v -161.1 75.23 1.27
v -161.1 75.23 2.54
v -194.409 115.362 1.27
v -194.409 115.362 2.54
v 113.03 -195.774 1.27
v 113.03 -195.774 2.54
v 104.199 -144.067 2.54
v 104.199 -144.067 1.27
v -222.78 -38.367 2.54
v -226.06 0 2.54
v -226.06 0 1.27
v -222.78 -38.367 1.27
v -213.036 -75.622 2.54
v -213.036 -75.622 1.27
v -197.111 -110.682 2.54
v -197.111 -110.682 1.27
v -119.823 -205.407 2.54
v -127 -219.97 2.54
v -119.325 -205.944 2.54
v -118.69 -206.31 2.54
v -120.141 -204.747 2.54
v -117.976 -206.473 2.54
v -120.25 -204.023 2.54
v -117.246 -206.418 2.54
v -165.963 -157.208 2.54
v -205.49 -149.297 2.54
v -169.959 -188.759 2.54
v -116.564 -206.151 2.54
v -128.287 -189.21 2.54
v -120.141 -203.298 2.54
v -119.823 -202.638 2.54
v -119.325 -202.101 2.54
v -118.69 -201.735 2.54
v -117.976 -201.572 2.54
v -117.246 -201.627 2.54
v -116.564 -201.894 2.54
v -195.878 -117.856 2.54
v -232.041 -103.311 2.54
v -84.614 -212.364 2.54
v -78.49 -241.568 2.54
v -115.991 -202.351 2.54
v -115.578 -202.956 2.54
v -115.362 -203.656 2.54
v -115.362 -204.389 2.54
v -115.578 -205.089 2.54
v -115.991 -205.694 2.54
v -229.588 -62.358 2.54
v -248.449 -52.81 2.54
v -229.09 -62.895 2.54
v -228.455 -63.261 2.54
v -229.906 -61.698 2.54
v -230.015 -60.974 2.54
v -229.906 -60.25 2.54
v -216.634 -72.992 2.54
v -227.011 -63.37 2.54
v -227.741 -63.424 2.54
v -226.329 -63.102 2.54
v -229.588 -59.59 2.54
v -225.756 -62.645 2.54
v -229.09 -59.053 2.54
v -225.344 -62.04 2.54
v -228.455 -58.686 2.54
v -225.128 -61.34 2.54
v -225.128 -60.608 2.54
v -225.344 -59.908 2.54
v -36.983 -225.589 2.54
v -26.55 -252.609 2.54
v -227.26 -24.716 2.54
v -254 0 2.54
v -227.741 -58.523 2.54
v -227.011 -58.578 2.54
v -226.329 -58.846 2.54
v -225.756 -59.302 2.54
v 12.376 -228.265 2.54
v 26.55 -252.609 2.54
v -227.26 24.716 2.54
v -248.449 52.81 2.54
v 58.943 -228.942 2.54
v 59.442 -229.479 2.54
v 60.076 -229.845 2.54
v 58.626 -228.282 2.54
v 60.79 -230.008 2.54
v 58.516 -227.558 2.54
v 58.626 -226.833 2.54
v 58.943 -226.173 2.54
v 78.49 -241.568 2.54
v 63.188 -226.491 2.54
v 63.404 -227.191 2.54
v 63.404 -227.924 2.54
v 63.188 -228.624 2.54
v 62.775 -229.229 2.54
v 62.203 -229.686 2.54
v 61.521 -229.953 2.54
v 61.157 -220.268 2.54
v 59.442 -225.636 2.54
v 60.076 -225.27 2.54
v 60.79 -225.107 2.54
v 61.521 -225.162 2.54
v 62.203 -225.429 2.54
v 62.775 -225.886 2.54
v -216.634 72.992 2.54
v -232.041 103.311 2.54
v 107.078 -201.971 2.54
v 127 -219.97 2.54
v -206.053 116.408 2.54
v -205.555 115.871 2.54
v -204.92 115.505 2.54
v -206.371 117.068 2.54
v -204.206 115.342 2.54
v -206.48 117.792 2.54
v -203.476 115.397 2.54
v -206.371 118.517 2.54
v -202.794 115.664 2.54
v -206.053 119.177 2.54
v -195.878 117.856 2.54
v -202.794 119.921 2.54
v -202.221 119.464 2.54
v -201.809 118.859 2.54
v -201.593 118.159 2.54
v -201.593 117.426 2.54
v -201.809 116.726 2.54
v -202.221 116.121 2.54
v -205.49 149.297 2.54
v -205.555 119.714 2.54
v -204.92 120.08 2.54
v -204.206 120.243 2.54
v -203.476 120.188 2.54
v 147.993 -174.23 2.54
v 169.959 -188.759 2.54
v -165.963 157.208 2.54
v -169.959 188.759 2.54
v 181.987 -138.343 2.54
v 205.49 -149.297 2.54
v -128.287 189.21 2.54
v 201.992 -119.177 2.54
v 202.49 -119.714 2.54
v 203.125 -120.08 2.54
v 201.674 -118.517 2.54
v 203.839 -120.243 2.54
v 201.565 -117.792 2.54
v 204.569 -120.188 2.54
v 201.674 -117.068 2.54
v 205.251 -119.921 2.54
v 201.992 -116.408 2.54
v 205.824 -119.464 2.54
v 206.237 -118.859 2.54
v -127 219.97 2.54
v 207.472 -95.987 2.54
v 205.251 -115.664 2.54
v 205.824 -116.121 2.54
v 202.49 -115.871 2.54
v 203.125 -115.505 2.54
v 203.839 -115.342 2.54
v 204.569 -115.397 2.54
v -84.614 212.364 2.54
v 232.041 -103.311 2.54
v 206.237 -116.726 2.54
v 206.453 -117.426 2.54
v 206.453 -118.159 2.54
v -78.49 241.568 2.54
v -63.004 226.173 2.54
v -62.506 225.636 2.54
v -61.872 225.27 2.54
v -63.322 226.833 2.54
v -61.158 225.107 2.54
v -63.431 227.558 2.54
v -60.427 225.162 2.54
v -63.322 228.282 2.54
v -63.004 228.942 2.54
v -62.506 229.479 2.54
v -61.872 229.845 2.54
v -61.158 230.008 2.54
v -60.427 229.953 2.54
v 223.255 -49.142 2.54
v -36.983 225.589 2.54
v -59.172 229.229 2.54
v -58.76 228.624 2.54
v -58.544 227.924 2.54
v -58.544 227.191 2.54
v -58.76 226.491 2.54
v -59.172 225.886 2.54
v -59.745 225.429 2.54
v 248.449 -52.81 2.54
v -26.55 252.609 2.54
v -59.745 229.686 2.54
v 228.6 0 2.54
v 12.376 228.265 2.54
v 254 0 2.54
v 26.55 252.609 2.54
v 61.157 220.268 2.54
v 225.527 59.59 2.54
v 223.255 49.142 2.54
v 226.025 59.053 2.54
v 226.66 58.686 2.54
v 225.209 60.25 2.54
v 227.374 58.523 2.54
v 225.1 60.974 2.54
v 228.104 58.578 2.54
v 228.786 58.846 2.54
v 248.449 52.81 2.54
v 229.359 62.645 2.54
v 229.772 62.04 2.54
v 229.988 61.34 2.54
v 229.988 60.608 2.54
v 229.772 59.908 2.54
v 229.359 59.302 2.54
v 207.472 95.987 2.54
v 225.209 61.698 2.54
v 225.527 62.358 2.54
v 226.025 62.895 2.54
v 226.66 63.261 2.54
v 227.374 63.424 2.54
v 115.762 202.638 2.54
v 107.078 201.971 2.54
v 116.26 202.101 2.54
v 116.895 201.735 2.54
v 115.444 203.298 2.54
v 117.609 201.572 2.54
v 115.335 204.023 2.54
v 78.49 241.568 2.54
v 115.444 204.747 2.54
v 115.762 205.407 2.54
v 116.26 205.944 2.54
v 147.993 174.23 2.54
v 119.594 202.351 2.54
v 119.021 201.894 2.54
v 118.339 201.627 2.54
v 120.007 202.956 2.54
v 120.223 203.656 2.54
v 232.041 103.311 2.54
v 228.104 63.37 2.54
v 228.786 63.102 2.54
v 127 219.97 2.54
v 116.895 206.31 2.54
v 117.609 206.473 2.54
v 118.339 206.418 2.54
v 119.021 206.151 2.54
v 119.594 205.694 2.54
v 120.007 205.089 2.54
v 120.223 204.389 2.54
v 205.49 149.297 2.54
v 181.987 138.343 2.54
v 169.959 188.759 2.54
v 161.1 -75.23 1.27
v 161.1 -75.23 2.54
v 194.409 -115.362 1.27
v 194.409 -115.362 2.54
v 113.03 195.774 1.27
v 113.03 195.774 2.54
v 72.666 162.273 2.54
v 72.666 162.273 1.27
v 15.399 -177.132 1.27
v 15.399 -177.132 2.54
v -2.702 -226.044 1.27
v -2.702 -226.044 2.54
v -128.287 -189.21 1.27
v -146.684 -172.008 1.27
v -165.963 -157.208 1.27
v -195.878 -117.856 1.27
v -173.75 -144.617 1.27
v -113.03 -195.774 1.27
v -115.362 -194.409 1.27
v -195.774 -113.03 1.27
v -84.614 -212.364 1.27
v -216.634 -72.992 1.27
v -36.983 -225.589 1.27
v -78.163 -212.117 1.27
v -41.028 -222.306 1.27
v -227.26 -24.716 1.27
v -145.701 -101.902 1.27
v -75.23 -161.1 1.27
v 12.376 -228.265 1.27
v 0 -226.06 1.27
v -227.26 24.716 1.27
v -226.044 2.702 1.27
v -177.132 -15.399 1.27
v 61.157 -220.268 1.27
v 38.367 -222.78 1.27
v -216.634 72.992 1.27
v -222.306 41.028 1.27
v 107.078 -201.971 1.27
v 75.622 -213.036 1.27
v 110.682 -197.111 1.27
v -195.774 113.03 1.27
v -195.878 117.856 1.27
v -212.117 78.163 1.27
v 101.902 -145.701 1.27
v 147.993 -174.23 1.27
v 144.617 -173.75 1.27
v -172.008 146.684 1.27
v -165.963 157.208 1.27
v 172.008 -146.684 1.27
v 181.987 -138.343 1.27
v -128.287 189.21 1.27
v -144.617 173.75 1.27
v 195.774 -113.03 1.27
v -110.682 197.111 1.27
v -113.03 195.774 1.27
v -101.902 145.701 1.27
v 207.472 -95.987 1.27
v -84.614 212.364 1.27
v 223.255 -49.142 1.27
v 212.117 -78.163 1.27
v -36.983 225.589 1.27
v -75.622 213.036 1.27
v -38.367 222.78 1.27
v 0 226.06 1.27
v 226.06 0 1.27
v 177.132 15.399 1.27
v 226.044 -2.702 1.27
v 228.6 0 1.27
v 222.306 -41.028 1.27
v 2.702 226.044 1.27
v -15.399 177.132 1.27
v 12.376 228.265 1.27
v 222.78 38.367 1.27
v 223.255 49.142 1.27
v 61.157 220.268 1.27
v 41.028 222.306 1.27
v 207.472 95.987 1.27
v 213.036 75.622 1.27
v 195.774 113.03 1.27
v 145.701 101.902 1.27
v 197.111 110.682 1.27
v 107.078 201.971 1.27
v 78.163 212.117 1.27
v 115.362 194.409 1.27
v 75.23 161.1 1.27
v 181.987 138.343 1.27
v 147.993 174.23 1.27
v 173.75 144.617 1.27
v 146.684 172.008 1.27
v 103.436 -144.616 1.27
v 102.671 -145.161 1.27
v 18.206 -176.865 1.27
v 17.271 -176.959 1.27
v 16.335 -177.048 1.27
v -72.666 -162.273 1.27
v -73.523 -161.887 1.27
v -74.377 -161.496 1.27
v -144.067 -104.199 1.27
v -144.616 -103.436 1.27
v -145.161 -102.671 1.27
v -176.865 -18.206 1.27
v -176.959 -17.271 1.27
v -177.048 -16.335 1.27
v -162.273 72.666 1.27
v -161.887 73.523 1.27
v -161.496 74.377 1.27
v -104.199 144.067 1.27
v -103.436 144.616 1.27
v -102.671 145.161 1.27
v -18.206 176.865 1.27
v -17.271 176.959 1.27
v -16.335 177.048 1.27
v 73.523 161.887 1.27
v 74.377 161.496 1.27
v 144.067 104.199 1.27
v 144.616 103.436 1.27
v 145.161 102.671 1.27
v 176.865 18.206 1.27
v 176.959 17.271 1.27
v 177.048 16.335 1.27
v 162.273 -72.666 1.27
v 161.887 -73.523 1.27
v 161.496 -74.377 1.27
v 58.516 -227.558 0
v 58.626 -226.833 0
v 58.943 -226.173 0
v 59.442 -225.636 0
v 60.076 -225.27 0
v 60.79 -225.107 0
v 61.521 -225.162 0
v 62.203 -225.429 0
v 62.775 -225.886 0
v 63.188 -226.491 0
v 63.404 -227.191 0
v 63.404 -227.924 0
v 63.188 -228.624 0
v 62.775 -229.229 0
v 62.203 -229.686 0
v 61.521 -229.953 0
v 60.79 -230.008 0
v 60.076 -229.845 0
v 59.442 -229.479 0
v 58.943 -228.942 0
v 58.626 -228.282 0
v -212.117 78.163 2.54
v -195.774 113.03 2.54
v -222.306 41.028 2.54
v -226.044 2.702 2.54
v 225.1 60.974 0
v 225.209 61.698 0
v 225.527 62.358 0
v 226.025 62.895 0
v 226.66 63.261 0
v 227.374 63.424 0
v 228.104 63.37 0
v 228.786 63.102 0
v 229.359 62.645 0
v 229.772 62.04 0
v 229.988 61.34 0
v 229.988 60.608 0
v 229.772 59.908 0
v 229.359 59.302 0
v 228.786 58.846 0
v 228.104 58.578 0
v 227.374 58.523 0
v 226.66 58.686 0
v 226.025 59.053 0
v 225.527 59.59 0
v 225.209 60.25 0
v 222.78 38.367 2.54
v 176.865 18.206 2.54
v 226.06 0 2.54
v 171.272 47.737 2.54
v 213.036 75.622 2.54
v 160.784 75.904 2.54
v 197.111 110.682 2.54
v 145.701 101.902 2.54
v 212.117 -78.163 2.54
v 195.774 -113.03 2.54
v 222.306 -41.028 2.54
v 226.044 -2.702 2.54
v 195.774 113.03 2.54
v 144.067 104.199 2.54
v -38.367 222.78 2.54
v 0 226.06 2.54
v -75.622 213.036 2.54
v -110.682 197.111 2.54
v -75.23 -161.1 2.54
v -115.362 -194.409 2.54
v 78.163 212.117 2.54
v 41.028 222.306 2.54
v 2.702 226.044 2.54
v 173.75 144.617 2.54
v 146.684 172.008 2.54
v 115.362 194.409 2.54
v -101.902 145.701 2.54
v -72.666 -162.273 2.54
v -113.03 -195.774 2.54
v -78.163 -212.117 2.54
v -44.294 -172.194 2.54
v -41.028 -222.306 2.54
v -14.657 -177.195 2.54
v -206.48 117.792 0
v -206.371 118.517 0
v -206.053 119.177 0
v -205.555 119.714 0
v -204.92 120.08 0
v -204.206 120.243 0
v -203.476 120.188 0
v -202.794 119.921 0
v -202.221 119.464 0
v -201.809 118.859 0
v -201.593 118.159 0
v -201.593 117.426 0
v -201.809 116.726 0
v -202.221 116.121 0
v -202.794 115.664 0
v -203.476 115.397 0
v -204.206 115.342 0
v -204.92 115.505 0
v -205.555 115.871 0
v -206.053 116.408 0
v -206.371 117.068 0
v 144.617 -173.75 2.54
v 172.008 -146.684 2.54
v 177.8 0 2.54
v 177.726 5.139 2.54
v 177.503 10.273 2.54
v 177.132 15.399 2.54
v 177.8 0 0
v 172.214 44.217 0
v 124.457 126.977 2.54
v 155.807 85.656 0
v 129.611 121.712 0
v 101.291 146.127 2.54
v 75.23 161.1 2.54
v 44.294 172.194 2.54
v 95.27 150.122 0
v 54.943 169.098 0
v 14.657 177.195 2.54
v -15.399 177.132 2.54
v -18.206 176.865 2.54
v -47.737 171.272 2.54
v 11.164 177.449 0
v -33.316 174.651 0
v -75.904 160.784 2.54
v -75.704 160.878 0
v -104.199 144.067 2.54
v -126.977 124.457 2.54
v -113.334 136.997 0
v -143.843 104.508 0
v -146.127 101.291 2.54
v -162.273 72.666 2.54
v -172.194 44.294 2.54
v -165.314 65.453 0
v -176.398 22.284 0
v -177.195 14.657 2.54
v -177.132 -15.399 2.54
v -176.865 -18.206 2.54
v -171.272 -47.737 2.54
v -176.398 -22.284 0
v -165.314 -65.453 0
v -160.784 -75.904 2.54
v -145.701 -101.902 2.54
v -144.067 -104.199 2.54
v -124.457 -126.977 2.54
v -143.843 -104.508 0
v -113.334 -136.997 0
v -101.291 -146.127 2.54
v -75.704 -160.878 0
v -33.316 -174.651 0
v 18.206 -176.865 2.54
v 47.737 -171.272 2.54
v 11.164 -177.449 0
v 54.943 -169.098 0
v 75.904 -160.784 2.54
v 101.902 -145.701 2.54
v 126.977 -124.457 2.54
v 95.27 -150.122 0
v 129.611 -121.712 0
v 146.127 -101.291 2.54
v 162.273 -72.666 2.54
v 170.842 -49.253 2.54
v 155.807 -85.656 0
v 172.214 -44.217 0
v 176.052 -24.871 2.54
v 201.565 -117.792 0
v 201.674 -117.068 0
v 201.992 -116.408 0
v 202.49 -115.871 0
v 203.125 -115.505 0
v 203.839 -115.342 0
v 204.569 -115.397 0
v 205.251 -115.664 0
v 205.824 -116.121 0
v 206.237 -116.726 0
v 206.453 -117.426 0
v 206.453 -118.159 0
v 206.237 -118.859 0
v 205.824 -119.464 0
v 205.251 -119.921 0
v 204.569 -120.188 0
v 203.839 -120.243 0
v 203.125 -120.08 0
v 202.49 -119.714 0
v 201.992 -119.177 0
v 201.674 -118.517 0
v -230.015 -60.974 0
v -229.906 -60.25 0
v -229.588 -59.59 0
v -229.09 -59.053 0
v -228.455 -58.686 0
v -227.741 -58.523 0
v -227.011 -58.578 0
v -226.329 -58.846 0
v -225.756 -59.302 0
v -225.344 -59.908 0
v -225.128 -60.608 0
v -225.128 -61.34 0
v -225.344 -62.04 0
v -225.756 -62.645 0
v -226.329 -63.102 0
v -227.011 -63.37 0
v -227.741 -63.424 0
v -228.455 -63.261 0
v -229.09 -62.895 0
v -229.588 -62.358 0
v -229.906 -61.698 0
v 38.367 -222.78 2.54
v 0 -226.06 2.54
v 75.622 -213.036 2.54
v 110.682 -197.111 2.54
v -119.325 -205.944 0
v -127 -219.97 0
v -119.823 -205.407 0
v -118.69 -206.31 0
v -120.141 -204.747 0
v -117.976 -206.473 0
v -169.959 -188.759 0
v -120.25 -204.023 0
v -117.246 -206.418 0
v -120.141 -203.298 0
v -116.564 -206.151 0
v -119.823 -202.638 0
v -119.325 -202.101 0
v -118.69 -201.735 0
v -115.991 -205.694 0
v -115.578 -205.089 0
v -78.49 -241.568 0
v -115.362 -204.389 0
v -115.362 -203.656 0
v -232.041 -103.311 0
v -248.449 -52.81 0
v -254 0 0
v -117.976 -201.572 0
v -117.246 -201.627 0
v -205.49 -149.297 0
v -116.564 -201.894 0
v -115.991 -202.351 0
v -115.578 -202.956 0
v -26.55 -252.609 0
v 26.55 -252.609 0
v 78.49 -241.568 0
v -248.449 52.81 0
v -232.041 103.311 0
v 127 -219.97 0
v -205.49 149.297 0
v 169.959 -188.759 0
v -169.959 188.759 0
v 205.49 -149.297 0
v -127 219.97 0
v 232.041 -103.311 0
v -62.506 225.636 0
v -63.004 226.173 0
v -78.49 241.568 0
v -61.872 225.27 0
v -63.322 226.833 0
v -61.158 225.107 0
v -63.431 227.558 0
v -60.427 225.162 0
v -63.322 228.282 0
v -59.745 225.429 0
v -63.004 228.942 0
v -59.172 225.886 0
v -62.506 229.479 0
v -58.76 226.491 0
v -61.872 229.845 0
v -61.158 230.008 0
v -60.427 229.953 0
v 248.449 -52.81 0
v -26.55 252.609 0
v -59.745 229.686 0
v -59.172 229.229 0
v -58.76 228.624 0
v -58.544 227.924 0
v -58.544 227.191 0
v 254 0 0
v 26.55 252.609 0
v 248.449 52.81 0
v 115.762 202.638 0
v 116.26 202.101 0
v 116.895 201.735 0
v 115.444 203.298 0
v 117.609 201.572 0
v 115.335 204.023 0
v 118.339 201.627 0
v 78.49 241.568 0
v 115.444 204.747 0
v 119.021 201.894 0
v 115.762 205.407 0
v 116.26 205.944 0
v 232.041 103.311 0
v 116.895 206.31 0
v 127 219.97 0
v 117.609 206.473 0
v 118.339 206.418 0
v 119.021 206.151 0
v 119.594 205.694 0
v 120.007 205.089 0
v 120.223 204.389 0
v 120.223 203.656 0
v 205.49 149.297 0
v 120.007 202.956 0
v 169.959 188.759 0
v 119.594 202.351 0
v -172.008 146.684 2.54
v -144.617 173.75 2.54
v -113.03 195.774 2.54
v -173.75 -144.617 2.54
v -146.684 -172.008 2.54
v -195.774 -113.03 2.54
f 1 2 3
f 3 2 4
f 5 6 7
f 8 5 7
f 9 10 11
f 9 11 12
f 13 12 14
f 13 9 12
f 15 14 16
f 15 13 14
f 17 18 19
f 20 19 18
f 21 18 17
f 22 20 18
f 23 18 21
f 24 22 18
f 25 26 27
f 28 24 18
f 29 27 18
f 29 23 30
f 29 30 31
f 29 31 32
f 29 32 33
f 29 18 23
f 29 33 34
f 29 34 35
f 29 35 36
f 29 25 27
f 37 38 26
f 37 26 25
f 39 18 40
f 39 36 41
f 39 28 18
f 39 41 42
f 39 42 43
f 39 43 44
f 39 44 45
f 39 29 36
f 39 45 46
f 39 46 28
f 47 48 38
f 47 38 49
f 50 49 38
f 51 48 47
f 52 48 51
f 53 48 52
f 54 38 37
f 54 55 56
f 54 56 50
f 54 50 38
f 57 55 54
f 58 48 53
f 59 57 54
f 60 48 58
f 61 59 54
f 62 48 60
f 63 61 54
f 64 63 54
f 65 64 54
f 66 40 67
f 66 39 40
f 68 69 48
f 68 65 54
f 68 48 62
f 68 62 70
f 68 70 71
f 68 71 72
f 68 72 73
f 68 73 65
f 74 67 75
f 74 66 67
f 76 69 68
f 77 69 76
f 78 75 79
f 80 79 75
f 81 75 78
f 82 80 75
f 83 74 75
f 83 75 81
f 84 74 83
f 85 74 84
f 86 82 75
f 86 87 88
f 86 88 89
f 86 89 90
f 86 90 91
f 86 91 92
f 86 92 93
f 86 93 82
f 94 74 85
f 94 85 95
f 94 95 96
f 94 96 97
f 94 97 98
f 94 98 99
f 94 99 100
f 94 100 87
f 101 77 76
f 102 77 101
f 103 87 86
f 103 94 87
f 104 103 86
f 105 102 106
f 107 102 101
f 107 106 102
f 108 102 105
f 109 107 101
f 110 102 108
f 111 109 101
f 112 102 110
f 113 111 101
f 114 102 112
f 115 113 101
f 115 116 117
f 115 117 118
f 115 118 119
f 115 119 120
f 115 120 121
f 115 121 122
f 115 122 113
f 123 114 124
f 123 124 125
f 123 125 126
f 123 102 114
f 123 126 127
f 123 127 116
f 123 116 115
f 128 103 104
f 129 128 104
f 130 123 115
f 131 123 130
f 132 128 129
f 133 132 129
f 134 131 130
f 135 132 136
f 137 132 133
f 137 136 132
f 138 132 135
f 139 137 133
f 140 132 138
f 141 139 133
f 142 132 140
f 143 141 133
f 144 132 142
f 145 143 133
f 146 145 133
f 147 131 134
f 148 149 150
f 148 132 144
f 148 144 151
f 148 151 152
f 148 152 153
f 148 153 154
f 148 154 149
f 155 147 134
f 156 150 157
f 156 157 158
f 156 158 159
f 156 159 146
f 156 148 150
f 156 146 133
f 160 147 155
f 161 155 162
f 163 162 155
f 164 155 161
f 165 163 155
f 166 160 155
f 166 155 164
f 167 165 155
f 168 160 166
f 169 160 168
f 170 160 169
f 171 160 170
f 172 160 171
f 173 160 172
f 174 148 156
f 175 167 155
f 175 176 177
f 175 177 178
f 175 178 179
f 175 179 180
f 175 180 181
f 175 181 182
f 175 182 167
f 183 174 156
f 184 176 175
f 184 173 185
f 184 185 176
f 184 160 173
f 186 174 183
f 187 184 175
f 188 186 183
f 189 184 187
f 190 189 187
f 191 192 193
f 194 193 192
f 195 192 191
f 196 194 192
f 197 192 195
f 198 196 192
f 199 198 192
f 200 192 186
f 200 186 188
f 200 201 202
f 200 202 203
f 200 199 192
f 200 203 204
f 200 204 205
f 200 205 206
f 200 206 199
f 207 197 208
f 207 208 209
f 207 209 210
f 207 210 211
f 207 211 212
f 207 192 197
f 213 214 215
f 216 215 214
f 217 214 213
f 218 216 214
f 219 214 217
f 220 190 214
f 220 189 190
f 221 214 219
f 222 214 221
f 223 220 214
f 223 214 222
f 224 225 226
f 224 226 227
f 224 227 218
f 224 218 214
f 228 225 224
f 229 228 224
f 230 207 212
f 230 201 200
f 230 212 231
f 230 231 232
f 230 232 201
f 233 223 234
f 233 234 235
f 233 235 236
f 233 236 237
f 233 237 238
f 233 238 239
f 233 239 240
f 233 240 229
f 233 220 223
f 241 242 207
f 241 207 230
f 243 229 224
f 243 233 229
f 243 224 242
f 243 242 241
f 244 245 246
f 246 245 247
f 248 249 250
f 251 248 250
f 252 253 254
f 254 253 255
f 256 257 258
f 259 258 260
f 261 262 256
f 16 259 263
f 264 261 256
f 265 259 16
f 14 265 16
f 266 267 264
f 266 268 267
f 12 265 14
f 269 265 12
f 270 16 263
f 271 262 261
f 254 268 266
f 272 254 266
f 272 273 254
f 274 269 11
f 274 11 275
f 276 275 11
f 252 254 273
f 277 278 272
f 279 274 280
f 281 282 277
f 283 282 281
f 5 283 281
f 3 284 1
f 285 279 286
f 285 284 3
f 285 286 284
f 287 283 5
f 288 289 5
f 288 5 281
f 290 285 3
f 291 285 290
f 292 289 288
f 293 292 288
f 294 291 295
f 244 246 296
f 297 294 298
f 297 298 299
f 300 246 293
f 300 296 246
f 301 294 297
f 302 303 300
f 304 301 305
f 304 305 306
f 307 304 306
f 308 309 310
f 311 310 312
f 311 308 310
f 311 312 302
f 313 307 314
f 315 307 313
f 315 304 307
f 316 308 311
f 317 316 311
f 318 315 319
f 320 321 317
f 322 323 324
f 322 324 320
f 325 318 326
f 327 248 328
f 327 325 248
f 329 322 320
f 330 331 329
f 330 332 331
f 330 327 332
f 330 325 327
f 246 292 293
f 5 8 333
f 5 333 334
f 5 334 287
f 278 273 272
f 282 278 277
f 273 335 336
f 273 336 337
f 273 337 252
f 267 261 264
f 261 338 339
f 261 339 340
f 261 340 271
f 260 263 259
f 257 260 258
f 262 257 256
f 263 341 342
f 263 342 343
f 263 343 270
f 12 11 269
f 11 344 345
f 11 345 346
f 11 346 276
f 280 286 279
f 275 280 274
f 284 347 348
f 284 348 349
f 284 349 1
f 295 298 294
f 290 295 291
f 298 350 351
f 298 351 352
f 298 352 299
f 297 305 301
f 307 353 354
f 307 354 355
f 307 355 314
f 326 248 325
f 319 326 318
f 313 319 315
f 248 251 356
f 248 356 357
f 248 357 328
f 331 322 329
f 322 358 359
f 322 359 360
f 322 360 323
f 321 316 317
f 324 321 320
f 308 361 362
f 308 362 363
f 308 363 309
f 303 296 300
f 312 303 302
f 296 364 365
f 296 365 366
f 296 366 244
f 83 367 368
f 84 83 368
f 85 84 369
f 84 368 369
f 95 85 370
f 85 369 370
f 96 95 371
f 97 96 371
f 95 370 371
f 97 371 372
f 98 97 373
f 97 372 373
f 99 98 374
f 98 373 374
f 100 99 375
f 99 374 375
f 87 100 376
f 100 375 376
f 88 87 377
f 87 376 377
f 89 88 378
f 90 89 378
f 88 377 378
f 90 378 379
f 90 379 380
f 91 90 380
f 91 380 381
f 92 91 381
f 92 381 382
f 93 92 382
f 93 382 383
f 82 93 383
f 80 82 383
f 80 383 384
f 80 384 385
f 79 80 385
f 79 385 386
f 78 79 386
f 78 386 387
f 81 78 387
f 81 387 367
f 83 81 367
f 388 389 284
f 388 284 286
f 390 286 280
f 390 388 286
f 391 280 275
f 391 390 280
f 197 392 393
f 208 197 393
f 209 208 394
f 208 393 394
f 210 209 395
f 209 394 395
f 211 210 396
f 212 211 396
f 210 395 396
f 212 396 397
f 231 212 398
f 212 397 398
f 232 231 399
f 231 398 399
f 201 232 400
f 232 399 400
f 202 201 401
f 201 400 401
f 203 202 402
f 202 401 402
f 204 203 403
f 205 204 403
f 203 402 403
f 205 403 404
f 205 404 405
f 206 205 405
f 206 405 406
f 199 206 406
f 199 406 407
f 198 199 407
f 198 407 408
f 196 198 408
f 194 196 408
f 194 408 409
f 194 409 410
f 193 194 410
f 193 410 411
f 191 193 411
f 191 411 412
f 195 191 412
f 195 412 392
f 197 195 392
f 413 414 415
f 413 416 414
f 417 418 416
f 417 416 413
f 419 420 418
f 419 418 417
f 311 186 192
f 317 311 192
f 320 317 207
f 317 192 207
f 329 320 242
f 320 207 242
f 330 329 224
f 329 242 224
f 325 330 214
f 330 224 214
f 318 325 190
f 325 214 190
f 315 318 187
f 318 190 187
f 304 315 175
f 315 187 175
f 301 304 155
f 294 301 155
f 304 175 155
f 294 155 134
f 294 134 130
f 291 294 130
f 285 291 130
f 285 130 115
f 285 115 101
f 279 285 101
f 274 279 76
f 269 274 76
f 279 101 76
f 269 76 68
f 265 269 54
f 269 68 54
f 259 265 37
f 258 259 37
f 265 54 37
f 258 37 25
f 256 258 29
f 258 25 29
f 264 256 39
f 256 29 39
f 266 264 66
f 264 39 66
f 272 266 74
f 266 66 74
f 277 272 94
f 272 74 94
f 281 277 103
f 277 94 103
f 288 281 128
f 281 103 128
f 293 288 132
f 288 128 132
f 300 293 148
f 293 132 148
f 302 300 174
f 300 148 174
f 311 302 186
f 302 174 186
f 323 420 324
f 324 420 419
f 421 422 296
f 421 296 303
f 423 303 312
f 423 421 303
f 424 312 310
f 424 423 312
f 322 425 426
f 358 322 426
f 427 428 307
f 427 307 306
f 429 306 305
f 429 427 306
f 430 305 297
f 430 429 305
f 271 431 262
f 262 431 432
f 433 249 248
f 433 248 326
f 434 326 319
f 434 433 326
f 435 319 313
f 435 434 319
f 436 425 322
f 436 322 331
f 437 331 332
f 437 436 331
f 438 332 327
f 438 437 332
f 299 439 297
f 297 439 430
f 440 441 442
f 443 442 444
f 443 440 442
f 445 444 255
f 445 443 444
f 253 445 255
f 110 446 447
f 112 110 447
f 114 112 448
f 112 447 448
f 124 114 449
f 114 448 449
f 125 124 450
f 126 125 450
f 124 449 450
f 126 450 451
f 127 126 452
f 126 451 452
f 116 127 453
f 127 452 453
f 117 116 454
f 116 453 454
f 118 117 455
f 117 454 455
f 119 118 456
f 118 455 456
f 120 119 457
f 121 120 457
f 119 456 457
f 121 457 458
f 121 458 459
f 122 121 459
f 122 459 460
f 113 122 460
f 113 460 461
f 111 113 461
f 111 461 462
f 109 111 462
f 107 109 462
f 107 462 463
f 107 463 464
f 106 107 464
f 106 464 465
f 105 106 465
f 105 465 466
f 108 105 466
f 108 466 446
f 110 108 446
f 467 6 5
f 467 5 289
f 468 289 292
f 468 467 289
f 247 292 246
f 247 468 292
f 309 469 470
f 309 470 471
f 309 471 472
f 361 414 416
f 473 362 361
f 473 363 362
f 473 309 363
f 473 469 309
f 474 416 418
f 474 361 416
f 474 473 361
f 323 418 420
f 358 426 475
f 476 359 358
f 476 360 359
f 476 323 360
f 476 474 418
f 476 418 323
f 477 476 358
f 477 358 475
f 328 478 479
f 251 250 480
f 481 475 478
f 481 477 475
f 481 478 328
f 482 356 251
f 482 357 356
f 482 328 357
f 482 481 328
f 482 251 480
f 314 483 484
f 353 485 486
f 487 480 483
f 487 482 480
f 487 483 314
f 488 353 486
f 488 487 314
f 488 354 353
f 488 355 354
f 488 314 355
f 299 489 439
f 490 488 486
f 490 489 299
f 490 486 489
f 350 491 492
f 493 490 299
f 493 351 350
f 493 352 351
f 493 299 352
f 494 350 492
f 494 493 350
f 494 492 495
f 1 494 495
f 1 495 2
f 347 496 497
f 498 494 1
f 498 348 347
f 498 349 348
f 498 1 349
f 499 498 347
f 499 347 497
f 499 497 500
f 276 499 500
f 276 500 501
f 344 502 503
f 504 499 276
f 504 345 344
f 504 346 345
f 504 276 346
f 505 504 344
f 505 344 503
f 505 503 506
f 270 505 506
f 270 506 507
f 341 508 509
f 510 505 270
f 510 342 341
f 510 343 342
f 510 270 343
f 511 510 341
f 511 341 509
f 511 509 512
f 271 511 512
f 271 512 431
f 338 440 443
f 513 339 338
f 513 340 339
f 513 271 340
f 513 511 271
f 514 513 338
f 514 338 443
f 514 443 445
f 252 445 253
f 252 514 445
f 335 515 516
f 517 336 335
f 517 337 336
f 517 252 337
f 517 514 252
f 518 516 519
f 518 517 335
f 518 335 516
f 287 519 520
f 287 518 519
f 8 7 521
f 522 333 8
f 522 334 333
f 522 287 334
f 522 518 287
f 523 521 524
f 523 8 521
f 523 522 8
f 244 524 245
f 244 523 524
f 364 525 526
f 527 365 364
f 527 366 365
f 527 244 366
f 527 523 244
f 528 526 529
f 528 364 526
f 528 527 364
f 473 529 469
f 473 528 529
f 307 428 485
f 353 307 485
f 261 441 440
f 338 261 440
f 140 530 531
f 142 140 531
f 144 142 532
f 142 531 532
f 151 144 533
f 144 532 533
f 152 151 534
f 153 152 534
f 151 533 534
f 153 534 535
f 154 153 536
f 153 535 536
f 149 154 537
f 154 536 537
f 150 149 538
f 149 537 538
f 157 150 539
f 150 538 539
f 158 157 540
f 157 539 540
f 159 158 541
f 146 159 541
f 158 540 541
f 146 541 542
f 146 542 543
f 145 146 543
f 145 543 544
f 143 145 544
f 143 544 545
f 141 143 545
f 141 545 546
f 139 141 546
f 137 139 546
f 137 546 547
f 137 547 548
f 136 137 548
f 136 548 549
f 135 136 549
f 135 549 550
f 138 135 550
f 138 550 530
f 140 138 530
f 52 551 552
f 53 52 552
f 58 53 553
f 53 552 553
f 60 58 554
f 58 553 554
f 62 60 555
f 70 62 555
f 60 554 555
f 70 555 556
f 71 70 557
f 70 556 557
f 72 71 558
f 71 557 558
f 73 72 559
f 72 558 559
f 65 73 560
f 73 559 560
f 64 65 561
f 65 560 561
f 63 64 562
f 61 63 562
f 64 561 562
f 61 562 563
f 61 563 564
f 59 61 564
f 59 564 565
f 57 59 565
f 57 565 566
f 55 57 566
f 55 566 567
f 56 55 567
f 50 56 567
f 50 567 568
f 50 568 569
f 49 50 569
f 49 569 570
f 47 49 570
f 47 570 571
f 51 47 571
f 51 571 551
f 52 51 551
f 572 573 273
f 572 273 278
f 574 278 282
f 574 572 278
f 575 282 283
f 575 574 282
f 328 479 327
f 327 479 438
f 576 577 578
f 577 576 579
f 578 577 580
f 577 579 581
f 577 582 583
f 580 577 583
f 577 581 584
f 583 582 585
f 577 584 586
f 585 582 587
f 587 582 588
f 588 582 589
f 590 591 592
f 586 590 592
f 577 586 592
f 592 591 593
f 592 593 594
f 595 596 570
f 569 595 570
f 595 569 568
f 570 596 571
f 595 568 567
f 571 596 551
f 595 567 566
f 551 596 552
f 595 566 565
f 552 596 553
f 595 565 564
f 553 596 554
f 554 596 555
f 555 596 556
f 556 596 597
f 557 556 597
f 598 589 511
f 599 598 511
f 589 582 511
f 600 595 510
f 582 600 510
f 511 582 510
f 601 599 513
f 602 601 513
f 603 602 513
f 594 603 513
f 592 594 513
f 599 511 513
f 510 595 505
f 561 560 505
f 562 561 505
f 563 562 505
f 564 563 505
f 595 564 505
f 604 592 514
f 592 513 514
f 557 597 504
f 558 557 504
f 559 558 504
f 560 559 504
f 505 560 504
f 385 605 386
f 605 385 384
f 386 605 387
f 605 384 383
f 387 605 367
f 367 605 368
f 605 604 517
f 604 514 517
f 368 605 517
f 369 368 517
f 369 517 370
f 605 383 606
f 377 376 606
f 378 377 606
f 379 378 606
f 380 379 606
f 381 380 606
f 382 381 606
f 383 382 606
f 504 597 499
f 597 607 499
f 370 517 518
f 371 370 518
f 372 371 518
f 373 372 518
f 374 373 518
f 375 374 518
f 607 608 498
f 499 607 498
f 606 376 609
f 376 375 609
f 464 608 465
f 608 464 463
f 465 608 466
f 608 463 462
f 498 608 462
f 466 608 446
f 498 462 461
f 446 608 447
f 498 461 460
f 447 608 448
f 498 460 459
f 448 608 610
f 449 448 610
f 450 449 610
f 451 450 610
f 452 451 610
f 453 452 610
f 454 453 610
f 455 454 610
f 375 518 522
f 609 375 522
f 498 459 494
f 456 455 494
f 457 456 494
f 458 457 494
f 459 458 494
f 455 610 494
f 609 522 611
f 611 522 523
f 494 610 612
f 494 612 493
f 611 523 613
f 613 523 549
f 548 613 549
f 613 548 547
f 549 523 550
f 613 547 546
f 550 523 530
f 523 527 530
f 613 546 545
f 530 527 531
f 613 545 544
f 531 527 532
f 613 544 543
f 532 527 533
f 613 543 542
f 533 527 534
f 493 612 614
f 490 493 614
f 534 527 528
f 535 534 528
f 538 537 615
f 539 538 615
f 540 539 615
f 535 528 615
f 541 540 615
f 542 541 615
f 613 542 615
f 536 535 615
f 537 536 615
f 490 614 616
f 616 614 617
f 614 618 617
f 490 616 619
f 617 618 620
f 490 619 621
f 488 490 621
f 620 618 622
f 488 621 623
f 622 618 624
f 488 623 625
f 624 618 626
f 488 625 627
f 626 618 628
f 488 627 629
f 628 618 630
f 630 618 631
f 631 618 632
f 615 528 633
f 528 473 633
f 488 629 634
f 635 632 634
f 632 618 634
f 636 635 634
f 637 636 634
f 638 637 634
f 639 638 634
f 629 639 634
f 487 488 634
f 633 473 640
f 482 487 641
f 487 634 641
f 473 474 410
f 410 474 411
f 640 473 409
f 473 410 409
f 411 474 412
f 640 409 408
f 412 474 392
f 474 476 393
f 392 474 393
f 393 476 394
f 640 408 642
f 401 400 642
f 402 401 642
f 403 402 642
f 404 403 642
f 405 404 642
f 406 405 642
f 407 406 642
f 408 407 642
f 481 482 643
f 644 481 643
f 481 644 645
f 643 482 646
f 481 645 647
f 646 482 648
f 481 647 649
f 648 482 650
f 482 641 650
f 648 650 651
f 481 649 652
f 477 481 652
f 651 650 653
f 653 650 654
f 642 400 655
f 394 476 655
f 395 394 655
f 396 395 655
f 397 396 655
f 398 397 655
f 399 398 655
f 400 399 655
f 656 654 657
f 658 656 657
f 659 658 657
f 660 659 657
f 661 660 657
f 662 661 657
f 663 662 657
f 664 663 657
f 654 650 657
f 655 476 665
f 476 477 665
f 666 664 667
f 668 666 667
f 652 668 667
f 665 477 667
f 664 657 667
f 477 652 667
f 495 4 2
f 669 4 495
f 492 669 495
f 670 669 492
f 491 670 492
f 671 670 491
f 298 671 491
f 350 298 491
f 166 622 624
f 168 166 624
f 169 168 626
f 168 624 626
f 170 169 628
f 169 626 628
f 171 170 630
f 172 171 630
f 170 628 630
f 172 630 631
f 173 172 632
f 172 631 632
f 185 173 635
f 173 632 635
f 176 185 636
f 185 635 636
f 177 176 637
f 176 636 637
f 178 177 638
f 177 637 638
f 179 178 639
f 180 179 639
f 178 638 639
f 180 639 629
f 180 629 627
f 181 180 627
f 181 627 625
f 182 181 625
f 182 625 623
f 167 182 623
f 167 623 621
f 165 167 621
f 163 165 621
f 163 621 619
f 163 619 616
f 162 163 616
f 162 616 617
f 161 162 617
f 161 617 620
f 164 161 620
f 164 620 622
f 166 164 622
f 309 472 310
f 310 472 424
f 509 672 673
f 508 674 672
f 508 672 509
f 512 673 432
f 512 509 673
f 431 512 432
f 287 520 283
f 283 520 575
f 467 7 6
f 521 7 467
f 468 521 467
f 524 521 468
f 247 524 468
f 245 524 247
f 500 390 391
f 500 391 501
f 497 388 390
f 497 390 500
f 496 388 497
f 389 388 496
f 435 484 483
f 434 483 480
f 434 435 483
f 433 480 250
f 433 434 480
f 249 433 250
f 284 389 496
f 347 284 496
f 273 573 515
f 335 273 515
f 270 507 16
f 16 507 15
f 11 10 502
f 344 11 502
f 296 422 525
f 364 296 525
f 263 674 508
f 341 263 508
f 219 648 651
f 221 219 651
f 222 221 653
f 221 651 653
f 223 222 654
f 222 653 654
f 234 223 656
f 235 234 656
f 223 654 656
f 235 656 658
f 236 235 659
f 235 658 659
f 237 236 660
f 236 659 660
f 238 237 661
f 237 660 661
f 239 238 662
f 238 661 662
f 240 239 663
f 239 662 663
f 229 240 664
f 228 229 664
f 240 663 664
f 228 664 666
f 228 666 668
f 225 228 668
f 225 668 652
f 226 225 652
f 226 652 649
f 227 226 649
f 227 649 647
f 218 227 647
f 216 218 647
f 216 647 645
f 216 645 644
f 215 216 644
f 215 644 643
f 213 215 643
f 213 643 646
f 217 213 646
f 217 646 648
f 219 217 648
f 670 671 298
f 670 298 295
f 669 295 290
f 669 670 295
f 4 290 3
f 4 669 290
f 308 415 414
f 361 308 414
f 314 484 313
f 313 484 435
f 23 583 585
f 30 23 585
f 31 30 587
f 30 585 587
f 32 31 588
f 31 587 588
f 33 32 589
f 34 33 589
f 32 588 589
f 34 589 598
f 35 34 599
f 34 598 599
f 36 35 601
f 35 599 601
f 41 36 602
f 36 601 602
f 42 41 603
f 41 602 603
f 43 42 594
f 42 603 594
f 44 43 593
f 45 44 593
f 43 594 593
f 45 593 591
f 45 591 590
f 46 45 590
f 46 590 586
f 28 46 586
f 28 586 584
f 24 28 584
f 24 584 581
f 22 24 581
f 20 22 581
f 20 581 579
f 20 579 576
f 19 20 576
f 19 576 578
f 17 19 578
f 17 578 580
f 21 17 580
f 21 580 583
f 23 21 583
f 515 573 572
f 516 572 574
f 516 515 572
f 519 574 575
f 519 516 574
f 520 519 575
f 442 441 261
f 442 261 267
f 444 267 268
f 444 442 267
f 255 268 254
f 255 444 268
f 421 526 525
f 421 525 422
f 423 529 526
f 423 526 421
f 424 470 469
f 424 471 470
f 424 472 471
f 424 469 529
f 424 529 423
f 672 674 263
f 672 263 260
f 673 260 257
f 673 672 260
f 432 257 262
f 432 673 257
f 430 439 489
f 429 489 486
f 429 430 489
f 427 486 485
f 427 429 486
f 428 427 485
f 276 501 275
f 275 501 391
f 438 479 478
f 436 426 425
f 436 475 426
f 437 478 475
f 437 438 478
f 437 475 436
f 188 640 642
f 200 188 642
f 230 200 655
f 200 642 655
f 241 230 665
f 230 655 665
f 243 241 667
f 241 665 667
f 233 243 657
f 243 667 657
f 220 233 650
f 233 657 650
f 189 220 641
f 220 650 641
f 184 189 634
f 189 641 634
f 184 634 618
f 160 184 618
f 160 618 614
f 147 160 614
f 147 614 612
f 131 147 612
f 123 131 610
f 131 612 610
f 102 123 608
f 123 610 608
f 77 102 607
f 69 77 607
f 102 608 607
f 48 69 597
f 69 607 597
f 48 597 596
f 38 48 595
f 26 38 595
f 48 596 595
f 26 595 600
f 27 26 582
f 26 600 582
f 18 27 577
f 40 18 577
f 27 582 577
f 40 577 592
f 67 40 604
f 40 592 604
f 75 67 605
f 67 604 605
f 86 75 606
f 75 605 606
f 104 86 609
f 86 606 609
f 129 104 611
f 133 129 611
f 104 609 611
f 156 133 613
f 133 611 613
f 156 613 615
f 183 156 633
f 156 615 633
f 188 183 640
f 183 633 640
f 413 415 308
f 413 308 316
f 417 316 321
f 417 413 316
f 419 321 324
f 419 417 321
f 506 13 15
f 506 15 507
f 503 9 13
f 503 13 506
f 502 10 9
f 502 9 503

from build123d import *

# Parameters (mm, degrees)
SKETCH1_R                    = 254
SKETCH1_R_2                  = 177.8
BOSS_EXTRUDE1_DEPTH          = 2.54
SKETCH2_R                    = 228.6
SKETCH2_R_2                  = 226.06
CUT_EXTRUDE1_DEPTH           = 1.27
CUT_EXTRUDE2_DEPTH           = 1.27
F_10_0_1935_DIAMETER_HOLE2_D = 4.9149


with BuildPart() as part:
    # Sketch1 → Boss-Extrude1 (new body)
    with BuildSketch(Plane.XY):
        Circle(SKETCH1_R)
        Circle(SKETCH1_R_2, mode=Mode.SUBTRACT)
    extrude(amount=BOSS_EXTRUDE1_DEPTH)

    # Sketch2 → Cut-Extrude1 (cut)
    with BuildSketch(Plane.XY.offset(2.54)):
        Circle(SKETCH2_R)
        Circle(SKETCH2_R_2, mode=Mode.SUBTRACT)
    extrude(amount=-CUT_EXTRUDE1_DEPTH, mode=Mode.SUBTRACT)

    # Sketch4 → Cut-Extrude2 (cut)
    with BuildSketch(Plane.XY.offset(2.54)):
        with BuildLine():
            Line((-226.06, 0), (-176.125415463, -18.479751401))
            Line((-176.125415463, -18.479751401), (-175.243846947, -16.097643731))
            Line((-175.243846947, -16.097643731), (-226.043846947, 2.702379938))
            ThreePointArc((-226.043846947, 2.702379938), (-226.055961701, 1.351214107), (-226.06, 0))
        make_face()
        with BuildLine():
            Line((-195.77370278, 113.03), (-161.768959743, 72.058773562))
            Line((-161.768959743, 72.058773562), (-159.814445179, 73.680955061))
            Line((-159.814445179, 73.680955061), (-194.408523857, 115.36225315))
            ThreePointArc((-194.408523857, 115.36225315), (-195.094598456, 114.198166593), (-195.77370278, 113.03))
        make_face()
        with BuildLine():
            Line((-113.03, 195.77370278), (-104.066641901, 143.289208342))
            Line((-104.066641901, 143.289208342), (-101.562891886, 143.716801448))
            Line((-101.562891886, 143.716801448), (-110.681593797, 197.110903794))
            ThreePointArc((-110.681593797, 197.110903794), (-111.857795108, 196.445812563), (-113.03, 195.77370278))
        make_face()
        with BuildLine():
            Line((0, 226.06), (-18.479751401, 176.125415463))
            Line((-18.479751401, 176.125415463), (-16.097643731, 175.243846947))
            Line((-16.097643731, 175.243846947), (2.702379938, 226.043846947))
            ThreePointArc((2.702379938, 226.043846947), (1.351214107, 226.055961701), (0, 226.06))
        make_face()
        with BuildLine():
            Line((113.03, 195.77370278), (72.058773562, 161.768959743))
            Line((72.058773562, 161.768959743), (73.680955061, 159.814445179))
            Line((73.680955061, 159.814445179), (115.36225315, 194.408523857))
            ThreePointArc((115.36225315, 194.408523857), (114.198166593, 195.094598456), (113.03, 195.77370278))
        make_face()
        with BuildLine():
            Line((195.77370278, 113.03), (143.289208342, 104.066641901))
            Line((143.289208342, 104.066641901), (143.716801448, 101.562891886))
            Line((143.716801448, 101.562891886), (197.110903794, 110.681593797))
            ThreePointArc((197.110903794, 110.681593797), (196.445812563, 111.857795108), (195.77370278, 113.03))
        make_face()
        with BuildLine():
            Line((226.06, 0), (176.125415463, 18.479751401))
            Line((176.125415463, 18.479751401), (175.243846947, 16.097643731))
            Line((175.243846947, 16.097643731), (226.043846947, -2.702379938))
            ThreePointArc((226.043846947, -2.702379938), (226.055961701, -1.351214107), (226.06, 0))
        make_face()
        with BuildLine():
            Line((195.77370278, -113.03), (161.768959743, -72.058773562))
            Line((161.768959743, -72.058773562), (159.814445179, -73.680955061))
            Line((159.814445179, -73.680955061), (194.408523857, -115.36225315))
            ThreePointArc((194.408523857, -115.36225315), (195.094598456, -114.198166593), (195.77370278, -113.03))
        make_face()
        with BuildLine():
            Line((113.03, -195.77370278), (104.066641901, -143.289208342))
            Line((104.066641901, -143.289208342), (101.562891886, -143.716801448))
            Line((101.562891886, -143.716801448), (110.681593797, -197.110903794))
            ThreePointArc((110.681593797, -197.110903794), (111.857795108, -196.445812563), (113.03, -195.77370278))
        make_face()
        with BuildLine():
            Line((0, -226.06), (18.479751401, -176.125415463))
            Line((18.479751401, -176.125415463), (16.097643731, -175.243846947))
            Line((16.097643731, -175.243846947), (-2.702379938, -226.043846947))
            ThreePointArc((-2.702379938, -226.043846947), (-1.351214107, -226.055961701), (0, -226.06))
        make_face()
        with BuildLine():
            Line((-113.03, -195.77370278), (-72.058773562, -161.768959743))
            Line((-72.058773562, -161.768959743), (-73.680955061, -159.814445179))
            Line((-73.680955061, -159.814445179), (-115.36225315, -194.408523857))
            ThreePointArc((-115.36225315, -194.408523857), (-114.198166593, -195.094598456), (-113.03, -195.77370278))
        make_face()
        with BuildLine():
            Line((-195.77370278, -113.03), (-143.289208342, -104.066641901))
            Line((-143.289208342, -104.066641901), (-143.716801448, -101.562891886))
            Line((-143.716801448, -101.562891886), (-197.110903794, -110.681593797))
            ThreePointArc((-197.110903794, -110.681593797), (-196.445812563, -111.857795108), (-195.77370278, -113.03))
        make_face()
    extrude(amount=-CUT_EXTRUDE2_DEPTH, mode=Mode.SUBTRACT)

    # #10 (0.1935) Diameter Hole2 (through all)
    with Locations(Plane.XY.offset(2.54)):
        with Locations((-204.022594751, 117.7925), (-60.97388474, 227.557635786), (117.7925, 204.022594751), (227.557635786, 60.97388474), (204.022594751, -117.7925), (60.97388474, -227.557635786), (-117.7925, -204.022594751), (-227.557635786, -60.97388474)):
            Hole(F_10_0_1935_DIAMETER_HOLE2_D / 2)


solid = part.part
